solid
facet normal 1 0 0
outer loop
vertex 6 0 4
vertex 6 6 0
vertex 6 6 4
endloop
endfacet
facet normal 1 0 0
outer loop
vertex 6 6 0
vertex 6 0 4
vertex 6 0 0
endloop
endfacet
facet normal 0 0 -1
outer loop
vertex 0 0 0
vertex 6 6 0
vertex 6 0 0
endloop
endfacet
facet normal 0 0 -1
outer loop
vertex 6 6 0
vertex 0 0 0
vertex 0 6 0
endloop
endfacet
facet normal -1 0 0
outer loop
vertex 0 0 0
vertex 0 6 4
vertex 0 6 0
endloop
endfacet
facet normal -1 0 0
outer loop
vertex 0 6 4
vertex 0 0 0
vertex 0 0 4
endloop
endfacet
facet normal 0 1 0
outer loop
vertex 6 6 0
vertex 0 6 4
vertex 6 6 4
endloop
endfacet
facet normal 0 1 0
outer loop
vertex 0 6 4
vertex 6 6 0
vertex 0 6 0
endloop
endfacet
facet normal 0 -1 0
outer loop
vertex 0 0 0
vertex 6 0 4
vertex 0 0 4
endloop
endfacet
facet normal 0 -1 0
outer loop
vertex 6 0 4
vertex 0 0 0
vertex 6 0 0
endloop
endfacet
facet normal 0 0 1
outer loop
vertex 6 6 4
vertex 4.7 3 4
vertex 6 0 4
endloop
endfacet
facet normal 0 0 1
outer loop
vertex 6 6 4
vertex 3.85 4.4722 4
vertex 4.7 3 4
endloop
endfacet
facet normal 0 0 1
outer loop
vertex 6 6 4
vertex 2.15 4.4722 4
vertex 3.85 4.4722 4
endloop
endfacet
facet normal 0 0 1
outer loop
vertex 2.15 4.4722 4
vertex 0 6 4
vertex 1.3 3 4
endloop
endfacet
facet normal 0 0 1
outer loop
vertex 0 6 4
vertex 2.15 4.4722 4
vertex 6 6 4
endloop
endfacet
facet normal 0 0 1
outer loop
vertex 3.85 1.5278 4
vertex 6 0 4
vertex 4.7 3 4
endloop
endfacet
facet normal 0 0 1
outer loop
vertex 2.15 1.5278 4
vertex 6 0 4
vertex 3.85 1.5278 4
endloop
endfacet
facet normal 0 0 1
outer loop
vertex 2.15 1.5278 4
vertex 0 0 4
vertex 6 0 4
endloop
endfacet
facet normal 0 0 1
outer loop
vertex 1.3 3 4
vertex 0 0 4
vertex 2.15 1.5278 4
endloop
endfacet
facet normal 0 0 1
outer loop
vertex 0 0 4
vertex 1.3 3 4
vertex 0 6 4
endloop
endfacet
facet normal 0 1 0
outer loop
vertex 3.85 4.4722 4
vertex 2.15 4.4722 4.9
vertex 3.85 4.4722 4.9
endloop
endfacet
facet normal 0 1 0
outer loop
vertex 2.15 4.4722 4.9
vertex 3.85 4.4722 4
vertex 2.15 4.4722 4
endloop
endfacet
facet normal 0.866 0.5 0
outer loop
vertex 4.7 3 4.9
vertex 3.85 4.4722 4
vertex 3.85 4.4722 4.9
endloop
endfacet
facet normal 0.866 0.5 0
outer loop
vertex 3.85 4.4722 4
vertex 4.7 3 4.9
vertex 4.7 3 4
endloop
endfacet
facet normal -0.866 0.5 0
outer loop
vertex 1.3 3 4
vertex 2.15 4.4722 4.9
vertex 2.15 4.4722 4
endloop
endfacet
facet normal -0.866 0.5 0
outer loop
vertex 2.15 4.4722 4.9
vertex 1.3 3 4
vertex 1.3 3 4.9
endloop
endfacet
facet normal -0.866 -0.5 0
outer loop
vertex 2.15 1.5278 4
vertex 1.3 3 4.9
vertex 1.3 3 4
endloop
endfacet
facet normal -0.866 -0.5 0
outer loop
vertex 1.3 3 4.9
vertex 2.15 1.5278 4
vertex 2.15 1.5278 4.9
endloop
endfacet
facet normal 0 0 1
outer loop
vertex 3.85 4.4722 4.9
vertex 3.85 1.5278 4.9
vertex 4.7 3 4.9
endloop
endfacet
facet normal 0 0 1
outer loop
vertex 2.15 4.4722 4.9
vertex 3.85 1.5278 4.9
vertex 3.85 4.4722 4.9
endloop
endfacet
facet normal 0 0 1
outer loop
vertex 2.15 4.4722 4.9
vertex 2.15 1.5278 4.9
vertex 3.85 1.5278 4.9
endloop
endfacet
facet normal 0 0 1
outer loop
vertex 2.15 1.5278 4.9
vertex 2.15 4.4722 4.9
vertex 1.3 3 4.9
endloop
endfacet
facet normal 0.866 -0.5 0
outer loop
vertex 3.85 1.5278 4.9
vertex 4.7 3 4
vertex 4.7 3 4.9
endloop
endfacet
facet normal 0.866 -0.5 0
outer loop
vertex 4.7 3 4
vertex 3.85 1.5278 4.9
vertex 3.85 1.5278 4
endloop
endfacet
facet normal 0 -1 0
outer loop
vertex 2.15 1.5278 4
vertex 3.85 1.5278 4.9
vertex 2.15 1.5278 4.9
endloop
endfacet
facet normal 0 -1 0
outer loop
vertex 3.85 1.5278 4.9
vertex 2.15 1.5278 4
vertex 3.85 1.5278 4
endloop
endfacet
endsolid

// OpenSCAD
/**
 * simpleButton
 * @name simpleButton
 * @description simpleButton
 * @type Supbiece
 * @parent 
 */
module simpleButton(center = false, $fn = $fn) {

    x_size = 6;
    y_size = 6;
    z_size = 4;

    button_diameter = 3.4;
    button_z_size = 0.9;

    module _simpleButton() {
        color("DimGray")
            cube([x_size, y_size, z_size - 1], center = false);

        color("LightGrey")
            translate([0,0, z_size - 1])
            cube([x_size, y_size, 1], center = false);

        color("DimGray")
            translate([x_size / 2, y_size / 2, z_size])
                cylinder(h = button_z_size, d = button_diameter, $fn = $fn);
    }

    if (center) {
        translate([-x_size / 2, -y_size / 2, 0])
            _simpleButton();
    } else {
        _simpleButton();
    }
}

simpleButton();
